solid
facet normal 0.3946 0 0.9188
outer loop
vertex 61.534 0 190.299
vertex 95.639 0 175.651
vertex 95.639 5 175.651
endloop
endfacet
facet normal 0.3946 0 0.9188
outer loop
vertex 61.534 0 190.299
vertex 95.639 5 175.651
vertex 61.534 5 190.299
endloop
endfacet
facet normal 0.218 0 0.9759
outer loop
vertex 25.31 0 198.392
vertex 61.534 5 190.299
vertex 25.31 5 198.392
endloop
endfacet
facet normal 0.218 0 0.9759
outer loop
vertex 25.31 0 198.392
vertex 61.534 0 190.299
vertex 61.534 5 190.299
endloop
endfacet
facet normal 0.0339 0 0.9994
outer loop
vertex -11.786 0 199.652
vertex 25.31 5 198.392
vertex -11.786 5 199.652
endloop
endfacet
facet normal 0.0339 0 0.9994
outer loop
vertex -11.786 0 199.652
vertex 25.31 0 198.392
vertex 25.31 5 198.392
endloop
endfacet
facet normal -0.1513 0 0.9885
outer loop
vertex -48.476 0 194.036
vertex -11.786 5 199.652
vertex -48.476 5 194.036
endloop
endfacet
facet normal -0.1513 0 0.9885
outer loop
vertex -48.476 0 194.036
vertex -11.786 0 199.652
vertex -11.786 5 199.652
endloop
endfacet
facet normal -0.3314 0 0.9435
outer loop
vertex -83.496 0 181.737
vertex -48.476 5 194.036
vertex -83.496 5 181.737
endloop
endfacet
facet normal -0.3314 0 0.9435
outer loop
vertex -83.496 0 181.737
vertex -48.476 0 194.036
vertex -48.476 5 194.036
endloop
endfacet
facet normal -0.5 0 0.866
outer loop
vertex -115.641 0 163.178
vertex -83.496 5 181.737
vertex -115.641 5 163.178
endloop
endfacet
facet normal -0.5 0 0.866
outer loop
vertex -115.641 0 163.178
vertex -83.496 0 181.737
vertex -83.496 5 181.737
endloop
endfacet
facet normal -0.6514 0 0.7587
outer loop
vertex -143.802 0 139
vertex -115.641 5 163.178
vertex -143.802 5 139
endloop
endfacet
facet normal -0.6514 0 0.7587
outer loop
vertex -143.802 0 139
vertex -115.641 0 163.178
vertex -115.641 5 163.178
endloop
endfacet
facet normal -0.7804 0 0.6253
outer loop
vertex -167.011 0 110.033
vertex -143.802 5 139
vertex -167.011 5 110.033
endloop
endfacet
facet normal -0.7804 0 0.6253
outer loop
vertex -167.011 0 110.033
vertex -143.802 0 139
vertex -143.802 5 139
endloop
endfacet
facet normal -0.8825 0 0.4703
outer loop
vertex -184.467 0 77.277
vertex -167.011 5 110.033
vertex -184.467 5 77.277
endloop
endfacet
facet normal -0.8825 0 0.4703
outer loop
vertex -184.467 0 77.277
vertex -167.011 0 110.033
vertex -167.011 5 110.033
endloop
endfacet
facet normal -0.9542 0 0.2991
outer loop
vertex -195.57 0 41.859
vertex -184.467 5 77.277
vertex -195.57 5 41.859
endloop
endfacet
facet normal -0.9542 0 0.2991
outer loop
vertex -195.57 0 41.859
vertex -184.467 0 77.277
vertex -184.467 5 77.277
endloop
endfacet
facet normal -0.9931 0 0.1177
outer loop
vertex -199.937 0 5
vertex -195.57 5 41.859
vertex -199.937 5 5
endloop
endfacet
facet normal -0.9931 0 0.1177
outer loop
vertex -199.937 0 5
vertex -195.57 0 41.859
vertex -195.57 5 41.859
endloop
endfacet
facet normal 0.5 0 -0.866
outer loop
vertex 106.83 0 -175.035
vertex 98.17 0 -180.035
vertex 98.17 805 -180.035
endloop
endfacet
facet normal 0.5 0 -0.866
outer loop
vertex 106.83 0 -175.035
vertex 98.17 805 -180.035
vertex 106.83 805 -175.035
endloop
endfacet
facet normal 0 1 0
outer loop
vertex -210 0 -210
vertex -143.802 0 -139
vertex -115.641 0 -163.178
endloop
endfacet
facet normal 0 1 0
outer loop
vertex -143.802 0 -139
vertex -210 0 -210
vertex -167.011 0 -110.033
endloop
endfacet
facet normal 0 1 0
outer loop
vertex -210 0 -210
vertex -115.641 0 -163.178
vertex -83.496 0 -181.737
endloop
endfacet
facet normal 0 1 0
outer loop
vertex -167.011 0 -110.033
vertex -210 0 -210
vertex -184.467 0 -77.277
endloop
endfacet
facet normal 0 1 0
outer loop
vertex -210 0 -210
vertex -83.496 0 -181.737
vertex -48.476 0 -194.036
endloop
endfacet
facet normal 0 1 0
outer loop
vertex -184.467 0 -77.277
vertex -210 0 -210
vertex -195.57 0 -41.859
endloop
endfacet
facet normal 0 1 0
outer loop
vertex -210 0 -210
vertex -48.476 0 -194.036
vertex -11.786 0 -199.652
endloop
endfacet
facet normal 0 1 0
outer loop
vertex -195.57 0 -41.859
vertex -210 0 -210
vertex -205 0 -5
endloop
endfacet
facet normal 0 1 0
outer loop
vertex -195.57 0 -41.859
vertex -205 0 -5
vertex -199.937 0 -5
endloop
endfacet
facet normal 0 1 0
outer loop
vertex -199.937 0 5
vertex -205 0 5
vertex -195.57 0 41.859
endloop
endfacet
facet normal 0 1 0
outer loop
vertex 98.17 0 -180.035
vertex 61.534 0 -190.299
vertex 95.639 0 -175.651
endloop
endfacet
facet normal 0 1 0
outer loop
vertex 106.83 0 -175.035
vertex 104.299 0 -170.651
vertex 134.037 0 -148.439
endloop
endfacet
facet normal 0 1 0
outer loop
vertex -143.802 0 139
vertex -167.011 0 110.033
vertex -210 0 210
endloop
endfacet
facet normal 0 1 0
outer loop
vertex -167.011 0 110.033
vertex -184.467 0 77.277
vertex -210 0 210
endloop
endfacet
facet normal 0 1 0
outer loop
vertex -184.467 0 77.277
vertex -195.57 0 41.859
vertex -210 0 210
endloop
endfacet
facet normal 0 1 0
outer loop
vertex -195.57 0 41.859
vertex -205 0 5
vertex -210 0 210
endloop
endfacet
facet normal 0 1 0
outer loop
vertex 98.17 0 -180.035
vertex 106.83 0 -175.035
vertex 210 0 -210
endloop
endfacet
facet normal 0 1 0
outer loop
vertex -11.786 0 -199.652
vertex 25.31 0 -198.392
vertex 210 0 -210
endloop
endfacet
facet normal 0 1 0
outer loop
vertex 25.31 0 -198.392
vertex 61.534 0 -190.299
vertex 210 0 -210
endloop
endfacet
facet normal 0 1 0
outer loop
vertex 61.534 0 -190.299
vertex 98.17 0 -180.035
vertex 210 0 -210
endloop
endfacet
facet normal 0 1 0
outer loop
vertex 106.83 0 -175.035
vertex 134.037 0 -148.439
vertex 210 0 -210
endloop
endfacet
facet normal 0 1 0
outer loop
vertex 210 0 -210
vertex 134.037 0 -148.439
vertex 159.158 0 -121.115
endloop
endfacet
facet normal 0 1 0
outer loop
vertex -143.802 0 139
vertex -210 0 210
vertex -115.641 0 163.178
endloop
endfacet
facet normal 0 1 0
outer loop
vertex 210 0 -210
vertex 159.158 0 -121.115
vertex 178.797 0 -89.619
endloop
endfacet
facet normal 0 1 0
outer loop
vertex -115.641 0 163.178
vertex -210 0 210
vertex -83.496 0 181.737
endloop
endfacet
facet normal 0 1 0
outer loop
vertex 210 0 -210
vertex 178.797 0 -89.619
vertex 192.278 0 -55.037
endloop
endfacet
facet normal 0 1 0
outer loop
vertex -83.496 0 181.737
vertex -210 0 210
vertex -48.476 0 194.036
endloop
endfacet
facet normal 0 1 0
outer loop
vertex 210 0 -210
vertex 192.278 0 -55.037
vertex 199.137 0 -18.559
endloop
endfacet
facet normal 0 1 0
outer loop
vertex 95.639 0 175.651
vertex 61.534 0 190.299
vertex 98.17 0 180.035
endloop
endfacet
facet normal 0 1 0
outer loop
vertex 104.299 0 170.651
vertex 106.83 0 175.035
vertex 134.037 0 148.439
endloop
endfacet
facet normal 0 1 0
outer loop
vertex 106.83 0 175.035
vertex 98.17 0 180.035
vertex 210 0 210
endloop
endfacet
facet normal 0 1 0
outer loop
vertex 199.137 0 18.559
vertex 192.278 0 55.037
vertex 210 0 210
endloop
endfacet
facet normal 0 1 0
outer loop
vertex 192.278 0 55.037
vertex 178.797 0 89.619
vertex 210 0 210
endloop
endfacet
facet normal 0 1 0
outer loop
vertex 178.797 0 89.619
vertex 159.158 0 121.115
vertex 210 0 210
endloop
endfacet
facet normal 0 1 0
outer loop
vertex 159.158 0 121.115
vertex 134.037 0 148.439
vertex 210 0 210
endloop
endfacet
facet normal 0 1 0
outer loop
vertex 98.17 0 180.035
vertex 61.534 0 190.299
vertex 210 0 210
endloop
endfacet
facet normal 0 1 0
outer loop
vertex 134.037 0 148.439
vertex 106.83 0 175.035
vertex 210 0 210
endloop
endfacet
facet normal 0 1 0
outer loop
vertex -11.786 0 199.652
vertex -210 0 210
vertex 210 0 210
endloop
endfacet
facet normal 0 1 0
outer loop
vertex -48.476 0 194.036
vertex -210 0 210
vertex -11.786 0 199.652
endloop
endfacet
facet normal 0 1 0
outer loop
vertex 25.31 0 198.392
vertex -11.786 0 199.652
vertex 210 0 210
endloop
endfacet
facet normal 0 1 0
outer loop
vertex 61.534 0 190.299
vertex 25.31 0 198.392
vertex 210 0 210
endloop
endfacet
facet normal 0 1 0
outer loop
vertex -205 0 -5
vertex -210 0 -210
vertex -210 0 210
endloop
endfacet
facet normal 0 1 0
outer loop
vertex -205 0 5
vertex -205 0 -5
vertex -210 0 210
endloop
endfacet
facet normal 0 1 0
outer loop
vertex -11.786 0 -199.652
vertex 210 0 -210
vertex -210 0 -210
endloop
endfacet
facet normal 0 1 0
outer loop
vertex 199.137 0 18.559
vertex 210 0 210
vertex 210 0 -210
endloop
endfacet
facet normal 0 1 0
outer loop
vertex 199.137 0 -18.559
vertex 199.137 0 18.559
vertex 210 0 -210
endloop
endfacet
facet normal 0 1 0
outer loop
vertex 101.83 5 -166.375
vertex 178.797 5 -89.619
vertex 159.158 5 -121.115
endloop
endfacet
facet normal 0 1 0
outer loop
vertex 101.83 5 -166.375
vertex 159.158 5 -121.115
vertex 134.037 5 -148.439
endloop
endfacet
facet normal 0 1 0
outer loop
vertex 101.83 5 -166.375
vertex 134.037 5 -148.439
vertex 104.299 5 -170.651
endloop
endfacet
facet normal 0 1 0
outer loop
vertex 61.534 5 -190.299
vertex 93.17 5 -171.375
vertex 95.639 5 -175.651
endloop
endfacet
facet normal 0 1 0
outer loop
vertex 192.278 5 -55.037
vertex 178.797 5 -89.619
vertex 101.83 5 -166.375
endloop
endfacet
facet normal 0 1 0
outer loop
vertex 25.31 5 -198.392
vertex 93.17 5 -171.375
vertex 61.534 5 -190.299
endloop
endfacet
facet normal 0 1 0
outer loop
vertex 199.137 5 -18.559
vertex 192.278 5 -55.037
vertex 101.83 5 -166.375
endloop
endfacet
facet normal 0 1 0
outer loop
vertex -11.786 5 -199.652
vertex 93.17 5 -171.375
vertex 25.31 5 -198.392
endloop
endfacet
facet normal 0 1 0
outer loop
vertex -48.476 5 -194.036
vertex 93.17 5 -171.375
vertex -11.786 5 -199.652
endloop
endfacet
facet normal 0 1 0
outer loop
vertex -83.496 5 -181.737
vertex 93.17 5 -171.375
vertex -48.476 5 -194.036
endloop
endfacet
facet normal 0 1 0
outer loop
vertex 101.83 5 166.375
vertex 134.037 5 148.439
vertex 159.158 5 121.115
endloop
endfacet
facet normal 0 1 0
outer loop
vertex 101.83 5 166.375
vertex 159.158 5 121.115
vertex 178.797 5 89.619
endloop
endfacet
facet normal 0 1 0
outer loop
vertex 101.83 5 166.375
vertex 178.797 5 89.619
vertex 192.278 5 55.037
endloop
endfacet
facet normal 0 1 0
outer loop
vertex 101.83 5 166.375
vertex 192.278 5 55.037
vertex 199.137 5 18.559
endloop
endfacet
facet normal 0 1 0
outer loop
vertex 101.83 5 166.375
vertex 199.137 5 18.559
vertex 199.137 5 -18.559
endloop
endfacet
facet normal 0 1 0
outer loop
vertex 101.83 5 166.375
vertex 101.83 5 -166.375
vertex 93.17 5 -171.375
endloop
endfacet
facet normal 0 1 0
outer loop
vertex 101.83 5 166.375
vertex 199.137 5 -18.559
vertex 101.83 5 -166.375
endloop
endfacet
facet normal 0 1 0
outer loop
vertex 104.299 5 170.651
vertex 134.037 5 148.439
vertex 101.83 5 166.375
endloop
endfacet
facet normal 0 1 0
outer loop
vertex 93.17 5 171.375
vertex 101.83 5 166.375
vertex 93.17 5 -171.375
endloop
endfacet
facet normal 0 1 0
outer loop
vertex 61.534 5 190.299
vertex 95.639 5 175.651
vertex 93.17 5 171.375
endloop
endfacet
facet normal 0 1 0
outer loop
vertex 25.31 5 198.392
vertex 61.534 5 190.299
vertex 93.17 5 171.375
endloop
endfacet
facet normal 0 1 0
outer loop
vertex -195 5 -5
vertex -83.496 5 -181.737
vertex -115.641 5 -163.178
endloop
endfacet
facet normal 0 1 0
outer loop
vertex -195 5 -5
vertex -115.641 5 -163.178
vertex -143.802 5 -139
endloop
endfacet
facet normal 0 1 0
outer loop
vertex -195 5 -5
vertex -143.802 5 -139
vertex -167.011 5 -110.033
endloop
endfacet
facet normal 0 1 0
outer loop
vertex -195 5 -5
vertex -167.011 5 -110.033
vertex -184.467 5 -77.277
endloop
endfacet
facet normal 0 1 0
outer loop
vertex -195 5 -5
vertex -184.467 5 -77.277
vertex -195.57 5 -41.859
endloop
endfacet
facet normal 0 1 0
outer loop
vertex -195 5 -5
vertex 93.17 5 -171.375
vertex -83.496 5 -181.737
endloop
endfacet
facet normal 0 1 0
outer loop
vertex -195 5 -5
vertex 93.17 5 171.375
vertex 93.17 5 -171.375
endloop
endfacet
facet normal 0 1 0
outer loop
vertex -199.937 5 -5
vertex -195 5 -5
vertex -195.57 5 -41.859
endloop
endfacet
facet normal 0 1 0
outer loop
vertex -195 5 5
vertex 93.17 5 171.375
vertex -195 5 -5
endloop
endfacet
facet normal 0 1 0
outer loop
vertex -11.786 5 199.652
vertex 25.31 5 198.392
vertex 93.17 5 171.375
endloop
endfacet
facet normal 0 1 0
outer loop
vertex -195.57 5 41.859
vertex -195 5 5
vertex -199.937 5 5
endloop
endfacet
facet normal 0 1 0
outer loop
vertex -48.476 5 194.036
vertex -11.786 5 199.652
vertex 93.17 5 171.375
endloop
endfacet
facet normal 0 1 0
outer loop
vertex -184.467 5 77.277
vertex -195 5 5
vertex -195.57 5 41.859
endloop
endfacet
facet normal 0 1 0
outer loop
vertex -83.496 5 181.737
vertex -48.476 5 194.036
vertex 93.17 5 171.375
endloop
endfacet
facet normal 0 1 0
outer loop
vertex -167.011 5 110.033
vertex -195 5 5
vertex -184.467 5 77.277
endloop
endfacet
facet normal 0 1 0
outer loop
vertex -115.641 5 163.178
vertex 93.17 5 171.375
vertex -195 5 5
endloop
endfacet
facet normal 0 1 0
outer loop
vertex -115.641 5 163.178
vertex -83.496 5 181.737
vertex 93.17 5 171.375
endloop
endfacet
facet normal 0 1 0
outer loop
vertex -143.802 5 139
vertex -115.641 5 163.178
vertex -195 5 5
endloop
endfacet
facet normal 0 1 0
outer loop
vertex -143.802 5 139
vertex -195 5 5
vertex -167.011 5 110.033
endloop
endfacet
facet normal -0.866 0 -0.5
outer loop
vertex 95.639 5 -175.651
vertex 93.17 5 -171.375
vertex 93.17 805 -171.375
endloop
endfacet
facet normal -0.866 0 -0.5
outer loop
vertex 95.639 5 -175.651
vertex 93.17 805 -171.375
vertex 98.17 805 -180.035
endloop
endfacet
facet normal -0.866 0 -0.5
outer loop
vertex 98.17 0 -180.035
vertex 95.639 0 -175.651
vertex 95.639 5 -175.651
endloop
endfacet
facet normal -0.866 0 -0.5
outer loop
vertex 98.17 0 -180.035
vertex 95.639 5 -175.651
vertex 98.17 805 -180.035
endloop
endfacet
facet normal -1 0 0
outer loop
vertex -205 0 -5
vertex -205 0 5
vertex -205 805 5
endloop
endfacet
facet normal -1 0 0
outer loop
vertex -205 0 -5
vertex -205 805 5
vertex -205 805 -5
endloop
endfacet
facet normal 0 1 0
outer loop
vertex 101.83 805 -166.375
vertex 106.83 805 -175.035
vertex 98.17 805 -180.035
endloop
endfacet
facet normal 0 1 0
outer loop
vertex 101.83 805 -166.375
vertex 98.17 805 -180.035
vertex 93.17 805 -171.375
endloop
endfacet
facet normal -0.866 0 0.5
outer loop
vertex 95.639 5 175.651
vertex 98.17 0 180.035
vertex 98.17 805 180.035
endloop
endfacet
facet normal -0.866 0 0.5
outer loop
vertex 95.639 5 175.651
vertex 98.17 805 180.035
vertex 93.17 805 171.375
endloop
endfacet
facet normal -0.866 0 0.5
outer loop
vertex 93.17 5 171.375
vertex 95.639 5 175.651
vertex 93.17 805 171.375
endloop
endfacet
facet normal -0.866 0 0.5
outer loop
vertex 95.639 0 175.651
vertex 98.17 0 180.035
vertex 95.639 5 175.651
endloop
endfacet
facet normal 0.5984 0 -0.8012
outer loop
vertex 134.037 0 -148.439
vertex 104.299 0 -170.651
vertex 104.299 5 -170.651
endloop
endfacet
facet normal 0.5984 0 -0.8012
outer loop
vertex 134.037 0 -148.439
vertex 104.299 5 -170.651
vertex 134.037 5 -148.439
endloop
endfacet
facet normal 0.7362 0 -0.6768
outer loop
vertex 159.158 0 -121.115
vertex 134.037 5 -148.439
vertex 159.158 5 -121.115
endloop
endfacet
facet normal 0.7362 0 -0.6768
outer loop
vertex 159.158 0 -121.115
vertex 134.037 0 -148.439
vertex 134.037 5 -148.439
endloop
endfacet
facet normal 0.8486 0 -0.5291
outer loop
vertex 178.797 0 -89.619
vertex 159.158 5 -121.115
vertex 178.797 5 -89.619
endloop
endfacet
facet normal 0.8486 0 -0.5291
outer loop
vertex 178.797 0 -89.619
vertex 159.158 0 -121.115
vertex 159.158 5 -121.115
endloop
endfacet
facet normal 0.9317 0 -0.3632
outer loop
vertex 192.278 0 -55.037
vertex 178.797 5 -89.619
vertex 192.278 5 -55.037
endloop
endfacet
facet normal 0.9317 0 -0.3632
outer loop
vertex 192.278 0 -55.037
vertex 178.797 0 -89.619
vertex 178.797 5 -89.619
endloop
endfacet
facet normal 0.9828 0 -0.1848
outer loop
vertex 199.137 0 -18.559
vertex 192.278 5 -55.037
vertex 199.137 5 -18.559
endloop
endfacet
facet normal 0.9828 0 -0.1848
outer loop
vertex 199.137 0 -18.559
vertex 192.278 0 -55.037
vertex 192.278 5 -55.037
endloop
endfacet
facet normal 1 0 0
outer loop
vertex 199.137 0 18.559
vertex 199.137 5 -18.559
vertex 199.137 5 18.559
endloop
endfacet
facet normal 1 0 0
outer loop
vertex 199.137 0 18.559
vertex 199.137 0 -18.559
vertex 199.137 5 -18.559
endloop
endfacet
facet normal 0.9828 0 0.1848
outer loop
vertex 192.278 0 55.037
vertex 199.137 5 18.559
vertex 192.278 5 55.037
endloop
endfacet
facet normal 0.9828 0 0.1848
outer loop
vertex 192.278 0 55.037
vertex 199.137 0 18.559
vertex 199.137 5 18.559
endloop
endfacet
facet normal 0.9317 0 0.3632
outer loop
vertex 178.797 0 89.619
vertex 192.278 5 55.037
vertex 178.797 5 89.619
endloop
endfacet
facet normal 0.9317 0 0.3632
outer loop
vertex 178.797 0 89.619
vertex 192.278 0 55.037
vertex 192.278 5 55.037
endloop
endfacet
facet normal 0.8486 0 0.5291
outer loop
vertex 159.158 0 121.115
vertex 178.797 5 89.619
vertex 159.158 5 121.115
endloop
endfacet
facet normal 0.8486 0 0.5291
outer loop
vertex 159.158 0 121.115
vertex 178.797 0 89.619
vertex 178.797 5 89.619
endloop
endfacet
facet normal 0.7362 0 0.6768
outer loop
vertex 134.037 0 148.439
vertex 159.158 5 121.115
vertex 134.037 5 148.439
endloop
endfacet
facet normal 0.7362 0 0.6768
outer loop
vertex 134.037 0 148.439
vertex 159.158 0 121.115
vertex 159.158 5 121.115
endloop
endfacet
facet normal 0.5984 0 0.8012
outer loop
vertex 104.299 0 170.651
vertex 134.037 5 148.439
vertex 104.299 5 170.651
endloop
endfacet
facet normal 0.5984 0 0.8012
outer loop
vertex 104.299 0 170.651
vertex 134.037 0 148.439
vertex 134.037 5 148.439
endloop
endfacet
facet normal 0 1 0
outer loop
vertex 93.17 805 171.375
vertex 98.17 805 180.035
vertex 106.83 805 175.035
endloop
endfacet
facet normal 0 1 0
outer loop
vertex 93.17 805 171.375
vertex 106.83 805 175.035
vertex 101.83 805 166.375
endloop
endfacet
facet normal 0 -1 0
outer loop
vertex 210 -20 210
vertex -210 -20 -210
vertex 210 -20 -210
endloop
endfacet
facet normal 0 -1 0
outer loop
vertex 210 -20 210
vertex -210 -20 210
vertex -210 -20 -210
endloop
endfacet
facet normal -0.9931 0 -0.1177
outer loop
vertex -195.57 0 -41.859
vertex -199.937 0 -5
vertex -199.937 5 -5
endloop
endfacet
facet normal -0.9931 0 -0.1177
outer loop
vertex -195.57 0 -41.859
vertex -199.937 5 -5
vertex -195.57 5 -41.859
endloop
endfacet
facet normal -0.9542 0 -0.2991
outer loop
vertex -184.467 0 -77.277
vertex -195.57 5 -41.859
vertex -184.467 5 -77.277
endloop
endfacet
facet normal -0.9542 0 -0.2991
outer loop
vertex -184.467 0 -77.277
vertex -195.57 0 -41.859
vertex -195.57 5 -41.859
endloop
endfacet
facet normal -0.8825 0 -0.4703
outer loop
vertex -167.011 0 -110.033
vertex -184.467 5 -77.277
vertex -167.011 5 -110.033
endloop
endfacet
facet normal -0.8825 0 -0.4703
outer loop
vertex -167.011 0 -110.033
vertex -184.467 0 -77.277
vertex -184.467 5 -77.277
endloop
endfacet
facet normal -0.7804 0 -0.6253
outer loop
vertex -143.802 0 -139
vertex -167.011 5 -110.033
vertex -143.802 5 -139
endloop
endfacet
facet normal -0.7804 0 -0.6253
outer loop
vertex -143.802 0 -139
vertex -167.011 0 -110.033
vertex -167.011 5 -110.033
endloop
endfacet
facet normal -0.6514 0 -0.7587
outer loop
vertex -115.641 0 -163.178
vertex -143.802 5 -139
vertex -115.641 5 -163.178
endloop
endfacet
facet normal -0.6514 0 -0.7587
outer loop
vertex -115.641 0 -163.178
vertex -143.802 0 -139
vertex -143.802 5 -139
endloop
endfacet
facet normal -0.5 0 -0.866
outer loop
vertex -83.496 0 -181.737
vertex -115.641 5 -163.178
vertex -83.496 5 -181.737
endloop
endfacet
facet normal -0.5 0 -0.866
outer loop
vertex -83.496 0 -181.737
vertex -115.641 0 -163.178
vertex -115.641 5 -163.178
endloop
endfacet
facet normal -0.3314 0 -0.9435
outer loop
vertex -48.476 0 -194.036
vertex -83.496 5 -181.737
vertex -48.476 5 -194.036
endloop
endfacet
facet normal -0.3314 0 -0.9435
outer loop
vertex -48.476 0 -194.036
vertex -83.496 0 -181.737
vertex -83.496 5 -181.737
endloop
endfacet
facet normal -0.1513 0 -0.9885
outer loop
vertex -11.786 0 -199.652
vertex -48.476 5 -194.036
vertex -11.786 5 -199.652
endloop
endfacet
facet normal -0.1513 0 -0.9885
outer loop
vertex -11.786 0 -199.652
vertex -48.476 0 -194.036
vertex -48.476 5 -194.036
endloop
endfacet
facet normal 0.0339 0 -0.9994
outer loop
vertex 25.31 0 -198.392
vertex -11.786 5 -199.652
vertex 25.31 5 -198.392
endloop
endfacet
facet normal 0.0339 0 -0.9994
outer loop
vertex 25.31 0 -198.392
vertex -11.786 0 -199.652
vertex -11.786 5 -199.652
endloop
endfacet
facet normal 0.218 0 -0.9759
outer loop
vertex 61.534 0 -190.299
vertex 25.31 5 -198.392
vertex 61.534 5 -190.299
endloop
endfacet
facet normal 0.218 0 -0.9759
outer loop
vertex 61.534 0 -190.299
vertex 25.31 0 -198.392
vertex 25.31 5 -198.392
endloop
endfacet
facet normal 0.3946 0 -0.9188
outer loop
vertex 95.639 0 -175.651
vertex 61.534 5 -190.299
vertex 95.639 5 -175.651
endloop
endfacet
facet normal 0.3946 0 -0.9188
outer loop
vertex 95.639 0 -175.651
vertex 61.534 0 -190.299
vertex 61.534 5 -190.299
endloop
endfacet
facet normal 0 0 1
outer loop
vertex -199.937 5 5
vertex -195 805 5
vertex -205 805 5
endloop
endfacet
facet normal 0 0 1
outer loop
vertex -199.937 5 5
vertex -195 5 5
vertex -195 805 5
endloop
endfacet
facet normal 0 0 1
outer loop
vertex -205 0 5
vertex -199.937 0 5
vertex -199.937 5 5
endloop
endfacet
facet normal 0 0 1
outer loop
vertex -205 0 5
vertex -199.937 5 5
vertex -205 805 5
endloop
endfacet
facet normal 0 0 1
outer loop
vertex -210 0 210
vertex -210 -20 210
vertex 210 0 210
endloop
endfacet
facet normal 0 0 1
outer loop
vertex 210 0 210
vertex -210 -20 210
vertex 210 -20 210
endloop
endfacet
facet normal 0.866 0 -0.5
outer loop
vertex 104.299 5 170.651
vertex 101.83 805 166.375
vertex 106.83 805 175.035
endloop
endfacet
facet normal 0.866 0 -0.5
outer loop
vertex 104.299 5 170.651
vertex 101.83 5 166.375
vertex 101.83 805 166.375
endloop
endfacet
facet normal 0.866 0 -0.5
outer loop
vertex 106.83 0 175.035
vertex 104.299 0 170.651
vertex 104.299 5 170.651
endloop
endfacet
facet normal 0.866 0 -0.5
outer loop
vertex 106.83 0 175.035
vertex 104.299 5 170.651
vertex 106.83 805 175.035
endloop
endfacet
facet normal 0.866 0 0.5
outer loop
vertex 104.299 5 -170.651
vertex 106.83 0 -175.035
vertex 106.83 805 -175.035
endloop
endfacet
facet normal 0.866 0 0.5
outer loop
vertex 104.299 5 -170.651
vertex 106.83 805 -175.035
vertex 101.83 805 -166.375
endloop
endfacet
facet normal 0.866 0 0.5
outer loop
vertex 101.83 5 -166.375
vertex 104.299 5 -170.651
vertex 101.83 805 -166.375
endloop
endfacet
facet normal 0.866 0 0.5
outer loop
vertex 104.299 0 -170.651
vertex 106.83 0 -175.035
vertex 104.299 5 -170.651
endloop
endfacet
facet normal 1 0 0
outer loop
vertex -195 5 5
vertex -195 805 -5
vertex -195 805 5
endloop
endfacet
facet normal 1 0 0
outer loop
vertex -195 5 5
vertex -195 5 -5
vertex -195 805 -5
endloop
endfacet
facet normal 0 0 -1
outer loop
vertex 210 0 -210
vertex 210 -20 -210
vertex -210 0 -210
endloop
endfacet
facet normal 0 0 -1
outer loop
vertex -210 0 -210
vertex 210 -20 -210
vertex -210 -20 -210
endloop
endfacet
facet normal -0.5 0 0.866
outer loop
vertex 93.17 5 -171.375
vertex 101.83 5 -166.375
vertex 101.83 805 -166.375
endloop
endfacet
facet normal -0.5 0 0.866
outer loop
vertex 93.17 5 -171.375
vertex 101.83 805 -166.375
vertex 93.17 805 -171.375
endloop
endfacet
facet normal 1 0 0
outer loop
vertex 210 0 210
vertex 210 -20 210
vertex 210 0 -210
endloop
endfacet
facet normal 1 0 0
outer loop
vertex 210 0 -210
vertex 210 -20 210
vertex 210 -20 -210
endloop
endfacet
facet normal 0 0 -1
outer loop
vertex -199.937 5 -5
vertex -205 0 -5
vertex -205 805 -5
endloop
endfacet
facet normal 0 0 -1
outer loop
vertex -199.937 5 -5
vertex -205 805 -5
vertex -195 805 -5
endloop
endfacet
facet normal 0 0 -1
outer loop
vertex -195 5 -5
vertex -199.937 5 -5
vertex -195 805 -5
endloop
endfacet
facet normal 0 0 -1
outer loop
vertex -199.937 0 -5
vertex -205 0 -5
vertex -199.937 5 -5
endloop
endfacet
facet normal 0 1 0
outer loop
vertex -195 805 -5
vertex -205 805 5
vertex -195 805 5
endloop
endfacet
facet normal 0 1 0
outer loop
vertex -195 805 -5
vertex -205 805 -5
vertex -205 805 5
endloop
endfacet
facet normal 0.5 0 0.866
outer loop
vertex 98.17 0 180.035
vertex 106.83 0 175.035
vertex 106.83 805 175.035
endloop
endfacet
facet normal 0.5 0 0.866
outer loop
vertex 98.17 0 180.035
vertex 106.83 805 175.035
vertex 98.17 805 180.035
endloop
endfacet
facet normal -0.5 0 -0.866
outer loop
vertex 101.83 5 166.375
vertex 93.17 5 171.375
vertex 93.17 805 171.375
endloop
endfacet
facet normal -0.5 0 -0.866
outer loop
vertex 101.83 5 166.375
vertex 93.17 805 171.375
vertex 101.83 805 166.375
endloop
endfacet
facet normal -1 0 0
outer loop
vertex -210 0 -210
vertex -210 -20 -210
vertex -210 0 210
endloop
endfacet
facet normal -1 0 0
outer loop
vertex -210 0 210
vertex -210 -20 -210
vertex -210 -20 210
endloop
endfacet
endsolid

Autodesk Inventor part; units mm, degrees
ref_plane "YZ Plane" through (0, 0, 0) normal (1, 0, 0) x (0, 1, 0)
ref_plane "XZ Plane" through (0, 0, 0) normal (0, 1, 0) x (-1, 0, 0)
ref_plane "XY Plane" through (0, 0, 0) normal (0, 0, 1) x (1, 0, 0)
sketch "草圖1" plane through (0, 0, 0) normal (0, 1, 0) x (-1, 0, 0)
  circle A0 centre (0, 0) radius 200
  dimension "d0" = 400
extrude "擠出1" add sketch "草圖1" along normal blind 5
sketch "草圖2" plane through (0, 5, 0) normal (0, 1, 0) x (1, 0, 0)
  line L0 (-205, 5) -> (-195, 5)
  line L1 (-195, 5) -> (-195, -5)
  line L2 (-195, -5) -> (-205, -5)
  line L3 (-205, -5) -> (-205, 5)
  circle A0 centre (0, 0) radius 200 projected
  line L4 (-205, 5) -> (-195, -5) construction
  line L5 (-195, 5) -> (-205, -5) construction
  point P0 (-200, 0)
  dimension "d3" = 10
  dimension "d4" = 10
extrude "擠出2" add sketch "草圖2" along normal blind 800 and the other way blind 5 contours L0 A0 L2 L3 | L0 L1 L2 A0 picked at (-196.6644, -0.5556)
pattern_circular "環形陣列1" count 3 over 360 about axis through (0, 0, 0) along (0, 1, 0) of "擠出2"
sketch "草圖3" plane through (0, 0, 0) normal (0, -1, 0) x (1, 0, 0)
  line L0 (-200, 200) -> (200, 200)
  line L1 (200, 200) -> (200, -200)
  line L2 (200, -200) -> (-200, -200)
  line L3 (-200, -200) -> (-200, 200)
  line L4 (-200, 200) -> (200, -200) construction
  line L5 (200, 200) -> (-200, -200) construction
  point P0 (0, 0)
  dimension "d12" = 400
  dimension "d13" = 400
extrude "擠出3" add sketch "草圖3" along normal blind 20
sketch "草圖4" plane through (0, -20, 0) normal (0, -1, 0) x (1, 0, 0)
  line L0 (-210, 210) -> (210, 210)
  line L1 (210, 210) -> (210, -210)
  line L2 (210, -210) -> (-210, -210)
  line L3 (-210, -210) -> (-210, 210)
  line L4 (-210, 210) -> (210, -210) construction
  line L5 (210, 210) -> (-210, -210) construction
  point P0 (0, 0)
  dimension "d16" = 420
  dimension "d17" = 420
extrude "擠出4" add sketch "草圖4" against normal up to surface (20 mm away)
properties part number "底座"
